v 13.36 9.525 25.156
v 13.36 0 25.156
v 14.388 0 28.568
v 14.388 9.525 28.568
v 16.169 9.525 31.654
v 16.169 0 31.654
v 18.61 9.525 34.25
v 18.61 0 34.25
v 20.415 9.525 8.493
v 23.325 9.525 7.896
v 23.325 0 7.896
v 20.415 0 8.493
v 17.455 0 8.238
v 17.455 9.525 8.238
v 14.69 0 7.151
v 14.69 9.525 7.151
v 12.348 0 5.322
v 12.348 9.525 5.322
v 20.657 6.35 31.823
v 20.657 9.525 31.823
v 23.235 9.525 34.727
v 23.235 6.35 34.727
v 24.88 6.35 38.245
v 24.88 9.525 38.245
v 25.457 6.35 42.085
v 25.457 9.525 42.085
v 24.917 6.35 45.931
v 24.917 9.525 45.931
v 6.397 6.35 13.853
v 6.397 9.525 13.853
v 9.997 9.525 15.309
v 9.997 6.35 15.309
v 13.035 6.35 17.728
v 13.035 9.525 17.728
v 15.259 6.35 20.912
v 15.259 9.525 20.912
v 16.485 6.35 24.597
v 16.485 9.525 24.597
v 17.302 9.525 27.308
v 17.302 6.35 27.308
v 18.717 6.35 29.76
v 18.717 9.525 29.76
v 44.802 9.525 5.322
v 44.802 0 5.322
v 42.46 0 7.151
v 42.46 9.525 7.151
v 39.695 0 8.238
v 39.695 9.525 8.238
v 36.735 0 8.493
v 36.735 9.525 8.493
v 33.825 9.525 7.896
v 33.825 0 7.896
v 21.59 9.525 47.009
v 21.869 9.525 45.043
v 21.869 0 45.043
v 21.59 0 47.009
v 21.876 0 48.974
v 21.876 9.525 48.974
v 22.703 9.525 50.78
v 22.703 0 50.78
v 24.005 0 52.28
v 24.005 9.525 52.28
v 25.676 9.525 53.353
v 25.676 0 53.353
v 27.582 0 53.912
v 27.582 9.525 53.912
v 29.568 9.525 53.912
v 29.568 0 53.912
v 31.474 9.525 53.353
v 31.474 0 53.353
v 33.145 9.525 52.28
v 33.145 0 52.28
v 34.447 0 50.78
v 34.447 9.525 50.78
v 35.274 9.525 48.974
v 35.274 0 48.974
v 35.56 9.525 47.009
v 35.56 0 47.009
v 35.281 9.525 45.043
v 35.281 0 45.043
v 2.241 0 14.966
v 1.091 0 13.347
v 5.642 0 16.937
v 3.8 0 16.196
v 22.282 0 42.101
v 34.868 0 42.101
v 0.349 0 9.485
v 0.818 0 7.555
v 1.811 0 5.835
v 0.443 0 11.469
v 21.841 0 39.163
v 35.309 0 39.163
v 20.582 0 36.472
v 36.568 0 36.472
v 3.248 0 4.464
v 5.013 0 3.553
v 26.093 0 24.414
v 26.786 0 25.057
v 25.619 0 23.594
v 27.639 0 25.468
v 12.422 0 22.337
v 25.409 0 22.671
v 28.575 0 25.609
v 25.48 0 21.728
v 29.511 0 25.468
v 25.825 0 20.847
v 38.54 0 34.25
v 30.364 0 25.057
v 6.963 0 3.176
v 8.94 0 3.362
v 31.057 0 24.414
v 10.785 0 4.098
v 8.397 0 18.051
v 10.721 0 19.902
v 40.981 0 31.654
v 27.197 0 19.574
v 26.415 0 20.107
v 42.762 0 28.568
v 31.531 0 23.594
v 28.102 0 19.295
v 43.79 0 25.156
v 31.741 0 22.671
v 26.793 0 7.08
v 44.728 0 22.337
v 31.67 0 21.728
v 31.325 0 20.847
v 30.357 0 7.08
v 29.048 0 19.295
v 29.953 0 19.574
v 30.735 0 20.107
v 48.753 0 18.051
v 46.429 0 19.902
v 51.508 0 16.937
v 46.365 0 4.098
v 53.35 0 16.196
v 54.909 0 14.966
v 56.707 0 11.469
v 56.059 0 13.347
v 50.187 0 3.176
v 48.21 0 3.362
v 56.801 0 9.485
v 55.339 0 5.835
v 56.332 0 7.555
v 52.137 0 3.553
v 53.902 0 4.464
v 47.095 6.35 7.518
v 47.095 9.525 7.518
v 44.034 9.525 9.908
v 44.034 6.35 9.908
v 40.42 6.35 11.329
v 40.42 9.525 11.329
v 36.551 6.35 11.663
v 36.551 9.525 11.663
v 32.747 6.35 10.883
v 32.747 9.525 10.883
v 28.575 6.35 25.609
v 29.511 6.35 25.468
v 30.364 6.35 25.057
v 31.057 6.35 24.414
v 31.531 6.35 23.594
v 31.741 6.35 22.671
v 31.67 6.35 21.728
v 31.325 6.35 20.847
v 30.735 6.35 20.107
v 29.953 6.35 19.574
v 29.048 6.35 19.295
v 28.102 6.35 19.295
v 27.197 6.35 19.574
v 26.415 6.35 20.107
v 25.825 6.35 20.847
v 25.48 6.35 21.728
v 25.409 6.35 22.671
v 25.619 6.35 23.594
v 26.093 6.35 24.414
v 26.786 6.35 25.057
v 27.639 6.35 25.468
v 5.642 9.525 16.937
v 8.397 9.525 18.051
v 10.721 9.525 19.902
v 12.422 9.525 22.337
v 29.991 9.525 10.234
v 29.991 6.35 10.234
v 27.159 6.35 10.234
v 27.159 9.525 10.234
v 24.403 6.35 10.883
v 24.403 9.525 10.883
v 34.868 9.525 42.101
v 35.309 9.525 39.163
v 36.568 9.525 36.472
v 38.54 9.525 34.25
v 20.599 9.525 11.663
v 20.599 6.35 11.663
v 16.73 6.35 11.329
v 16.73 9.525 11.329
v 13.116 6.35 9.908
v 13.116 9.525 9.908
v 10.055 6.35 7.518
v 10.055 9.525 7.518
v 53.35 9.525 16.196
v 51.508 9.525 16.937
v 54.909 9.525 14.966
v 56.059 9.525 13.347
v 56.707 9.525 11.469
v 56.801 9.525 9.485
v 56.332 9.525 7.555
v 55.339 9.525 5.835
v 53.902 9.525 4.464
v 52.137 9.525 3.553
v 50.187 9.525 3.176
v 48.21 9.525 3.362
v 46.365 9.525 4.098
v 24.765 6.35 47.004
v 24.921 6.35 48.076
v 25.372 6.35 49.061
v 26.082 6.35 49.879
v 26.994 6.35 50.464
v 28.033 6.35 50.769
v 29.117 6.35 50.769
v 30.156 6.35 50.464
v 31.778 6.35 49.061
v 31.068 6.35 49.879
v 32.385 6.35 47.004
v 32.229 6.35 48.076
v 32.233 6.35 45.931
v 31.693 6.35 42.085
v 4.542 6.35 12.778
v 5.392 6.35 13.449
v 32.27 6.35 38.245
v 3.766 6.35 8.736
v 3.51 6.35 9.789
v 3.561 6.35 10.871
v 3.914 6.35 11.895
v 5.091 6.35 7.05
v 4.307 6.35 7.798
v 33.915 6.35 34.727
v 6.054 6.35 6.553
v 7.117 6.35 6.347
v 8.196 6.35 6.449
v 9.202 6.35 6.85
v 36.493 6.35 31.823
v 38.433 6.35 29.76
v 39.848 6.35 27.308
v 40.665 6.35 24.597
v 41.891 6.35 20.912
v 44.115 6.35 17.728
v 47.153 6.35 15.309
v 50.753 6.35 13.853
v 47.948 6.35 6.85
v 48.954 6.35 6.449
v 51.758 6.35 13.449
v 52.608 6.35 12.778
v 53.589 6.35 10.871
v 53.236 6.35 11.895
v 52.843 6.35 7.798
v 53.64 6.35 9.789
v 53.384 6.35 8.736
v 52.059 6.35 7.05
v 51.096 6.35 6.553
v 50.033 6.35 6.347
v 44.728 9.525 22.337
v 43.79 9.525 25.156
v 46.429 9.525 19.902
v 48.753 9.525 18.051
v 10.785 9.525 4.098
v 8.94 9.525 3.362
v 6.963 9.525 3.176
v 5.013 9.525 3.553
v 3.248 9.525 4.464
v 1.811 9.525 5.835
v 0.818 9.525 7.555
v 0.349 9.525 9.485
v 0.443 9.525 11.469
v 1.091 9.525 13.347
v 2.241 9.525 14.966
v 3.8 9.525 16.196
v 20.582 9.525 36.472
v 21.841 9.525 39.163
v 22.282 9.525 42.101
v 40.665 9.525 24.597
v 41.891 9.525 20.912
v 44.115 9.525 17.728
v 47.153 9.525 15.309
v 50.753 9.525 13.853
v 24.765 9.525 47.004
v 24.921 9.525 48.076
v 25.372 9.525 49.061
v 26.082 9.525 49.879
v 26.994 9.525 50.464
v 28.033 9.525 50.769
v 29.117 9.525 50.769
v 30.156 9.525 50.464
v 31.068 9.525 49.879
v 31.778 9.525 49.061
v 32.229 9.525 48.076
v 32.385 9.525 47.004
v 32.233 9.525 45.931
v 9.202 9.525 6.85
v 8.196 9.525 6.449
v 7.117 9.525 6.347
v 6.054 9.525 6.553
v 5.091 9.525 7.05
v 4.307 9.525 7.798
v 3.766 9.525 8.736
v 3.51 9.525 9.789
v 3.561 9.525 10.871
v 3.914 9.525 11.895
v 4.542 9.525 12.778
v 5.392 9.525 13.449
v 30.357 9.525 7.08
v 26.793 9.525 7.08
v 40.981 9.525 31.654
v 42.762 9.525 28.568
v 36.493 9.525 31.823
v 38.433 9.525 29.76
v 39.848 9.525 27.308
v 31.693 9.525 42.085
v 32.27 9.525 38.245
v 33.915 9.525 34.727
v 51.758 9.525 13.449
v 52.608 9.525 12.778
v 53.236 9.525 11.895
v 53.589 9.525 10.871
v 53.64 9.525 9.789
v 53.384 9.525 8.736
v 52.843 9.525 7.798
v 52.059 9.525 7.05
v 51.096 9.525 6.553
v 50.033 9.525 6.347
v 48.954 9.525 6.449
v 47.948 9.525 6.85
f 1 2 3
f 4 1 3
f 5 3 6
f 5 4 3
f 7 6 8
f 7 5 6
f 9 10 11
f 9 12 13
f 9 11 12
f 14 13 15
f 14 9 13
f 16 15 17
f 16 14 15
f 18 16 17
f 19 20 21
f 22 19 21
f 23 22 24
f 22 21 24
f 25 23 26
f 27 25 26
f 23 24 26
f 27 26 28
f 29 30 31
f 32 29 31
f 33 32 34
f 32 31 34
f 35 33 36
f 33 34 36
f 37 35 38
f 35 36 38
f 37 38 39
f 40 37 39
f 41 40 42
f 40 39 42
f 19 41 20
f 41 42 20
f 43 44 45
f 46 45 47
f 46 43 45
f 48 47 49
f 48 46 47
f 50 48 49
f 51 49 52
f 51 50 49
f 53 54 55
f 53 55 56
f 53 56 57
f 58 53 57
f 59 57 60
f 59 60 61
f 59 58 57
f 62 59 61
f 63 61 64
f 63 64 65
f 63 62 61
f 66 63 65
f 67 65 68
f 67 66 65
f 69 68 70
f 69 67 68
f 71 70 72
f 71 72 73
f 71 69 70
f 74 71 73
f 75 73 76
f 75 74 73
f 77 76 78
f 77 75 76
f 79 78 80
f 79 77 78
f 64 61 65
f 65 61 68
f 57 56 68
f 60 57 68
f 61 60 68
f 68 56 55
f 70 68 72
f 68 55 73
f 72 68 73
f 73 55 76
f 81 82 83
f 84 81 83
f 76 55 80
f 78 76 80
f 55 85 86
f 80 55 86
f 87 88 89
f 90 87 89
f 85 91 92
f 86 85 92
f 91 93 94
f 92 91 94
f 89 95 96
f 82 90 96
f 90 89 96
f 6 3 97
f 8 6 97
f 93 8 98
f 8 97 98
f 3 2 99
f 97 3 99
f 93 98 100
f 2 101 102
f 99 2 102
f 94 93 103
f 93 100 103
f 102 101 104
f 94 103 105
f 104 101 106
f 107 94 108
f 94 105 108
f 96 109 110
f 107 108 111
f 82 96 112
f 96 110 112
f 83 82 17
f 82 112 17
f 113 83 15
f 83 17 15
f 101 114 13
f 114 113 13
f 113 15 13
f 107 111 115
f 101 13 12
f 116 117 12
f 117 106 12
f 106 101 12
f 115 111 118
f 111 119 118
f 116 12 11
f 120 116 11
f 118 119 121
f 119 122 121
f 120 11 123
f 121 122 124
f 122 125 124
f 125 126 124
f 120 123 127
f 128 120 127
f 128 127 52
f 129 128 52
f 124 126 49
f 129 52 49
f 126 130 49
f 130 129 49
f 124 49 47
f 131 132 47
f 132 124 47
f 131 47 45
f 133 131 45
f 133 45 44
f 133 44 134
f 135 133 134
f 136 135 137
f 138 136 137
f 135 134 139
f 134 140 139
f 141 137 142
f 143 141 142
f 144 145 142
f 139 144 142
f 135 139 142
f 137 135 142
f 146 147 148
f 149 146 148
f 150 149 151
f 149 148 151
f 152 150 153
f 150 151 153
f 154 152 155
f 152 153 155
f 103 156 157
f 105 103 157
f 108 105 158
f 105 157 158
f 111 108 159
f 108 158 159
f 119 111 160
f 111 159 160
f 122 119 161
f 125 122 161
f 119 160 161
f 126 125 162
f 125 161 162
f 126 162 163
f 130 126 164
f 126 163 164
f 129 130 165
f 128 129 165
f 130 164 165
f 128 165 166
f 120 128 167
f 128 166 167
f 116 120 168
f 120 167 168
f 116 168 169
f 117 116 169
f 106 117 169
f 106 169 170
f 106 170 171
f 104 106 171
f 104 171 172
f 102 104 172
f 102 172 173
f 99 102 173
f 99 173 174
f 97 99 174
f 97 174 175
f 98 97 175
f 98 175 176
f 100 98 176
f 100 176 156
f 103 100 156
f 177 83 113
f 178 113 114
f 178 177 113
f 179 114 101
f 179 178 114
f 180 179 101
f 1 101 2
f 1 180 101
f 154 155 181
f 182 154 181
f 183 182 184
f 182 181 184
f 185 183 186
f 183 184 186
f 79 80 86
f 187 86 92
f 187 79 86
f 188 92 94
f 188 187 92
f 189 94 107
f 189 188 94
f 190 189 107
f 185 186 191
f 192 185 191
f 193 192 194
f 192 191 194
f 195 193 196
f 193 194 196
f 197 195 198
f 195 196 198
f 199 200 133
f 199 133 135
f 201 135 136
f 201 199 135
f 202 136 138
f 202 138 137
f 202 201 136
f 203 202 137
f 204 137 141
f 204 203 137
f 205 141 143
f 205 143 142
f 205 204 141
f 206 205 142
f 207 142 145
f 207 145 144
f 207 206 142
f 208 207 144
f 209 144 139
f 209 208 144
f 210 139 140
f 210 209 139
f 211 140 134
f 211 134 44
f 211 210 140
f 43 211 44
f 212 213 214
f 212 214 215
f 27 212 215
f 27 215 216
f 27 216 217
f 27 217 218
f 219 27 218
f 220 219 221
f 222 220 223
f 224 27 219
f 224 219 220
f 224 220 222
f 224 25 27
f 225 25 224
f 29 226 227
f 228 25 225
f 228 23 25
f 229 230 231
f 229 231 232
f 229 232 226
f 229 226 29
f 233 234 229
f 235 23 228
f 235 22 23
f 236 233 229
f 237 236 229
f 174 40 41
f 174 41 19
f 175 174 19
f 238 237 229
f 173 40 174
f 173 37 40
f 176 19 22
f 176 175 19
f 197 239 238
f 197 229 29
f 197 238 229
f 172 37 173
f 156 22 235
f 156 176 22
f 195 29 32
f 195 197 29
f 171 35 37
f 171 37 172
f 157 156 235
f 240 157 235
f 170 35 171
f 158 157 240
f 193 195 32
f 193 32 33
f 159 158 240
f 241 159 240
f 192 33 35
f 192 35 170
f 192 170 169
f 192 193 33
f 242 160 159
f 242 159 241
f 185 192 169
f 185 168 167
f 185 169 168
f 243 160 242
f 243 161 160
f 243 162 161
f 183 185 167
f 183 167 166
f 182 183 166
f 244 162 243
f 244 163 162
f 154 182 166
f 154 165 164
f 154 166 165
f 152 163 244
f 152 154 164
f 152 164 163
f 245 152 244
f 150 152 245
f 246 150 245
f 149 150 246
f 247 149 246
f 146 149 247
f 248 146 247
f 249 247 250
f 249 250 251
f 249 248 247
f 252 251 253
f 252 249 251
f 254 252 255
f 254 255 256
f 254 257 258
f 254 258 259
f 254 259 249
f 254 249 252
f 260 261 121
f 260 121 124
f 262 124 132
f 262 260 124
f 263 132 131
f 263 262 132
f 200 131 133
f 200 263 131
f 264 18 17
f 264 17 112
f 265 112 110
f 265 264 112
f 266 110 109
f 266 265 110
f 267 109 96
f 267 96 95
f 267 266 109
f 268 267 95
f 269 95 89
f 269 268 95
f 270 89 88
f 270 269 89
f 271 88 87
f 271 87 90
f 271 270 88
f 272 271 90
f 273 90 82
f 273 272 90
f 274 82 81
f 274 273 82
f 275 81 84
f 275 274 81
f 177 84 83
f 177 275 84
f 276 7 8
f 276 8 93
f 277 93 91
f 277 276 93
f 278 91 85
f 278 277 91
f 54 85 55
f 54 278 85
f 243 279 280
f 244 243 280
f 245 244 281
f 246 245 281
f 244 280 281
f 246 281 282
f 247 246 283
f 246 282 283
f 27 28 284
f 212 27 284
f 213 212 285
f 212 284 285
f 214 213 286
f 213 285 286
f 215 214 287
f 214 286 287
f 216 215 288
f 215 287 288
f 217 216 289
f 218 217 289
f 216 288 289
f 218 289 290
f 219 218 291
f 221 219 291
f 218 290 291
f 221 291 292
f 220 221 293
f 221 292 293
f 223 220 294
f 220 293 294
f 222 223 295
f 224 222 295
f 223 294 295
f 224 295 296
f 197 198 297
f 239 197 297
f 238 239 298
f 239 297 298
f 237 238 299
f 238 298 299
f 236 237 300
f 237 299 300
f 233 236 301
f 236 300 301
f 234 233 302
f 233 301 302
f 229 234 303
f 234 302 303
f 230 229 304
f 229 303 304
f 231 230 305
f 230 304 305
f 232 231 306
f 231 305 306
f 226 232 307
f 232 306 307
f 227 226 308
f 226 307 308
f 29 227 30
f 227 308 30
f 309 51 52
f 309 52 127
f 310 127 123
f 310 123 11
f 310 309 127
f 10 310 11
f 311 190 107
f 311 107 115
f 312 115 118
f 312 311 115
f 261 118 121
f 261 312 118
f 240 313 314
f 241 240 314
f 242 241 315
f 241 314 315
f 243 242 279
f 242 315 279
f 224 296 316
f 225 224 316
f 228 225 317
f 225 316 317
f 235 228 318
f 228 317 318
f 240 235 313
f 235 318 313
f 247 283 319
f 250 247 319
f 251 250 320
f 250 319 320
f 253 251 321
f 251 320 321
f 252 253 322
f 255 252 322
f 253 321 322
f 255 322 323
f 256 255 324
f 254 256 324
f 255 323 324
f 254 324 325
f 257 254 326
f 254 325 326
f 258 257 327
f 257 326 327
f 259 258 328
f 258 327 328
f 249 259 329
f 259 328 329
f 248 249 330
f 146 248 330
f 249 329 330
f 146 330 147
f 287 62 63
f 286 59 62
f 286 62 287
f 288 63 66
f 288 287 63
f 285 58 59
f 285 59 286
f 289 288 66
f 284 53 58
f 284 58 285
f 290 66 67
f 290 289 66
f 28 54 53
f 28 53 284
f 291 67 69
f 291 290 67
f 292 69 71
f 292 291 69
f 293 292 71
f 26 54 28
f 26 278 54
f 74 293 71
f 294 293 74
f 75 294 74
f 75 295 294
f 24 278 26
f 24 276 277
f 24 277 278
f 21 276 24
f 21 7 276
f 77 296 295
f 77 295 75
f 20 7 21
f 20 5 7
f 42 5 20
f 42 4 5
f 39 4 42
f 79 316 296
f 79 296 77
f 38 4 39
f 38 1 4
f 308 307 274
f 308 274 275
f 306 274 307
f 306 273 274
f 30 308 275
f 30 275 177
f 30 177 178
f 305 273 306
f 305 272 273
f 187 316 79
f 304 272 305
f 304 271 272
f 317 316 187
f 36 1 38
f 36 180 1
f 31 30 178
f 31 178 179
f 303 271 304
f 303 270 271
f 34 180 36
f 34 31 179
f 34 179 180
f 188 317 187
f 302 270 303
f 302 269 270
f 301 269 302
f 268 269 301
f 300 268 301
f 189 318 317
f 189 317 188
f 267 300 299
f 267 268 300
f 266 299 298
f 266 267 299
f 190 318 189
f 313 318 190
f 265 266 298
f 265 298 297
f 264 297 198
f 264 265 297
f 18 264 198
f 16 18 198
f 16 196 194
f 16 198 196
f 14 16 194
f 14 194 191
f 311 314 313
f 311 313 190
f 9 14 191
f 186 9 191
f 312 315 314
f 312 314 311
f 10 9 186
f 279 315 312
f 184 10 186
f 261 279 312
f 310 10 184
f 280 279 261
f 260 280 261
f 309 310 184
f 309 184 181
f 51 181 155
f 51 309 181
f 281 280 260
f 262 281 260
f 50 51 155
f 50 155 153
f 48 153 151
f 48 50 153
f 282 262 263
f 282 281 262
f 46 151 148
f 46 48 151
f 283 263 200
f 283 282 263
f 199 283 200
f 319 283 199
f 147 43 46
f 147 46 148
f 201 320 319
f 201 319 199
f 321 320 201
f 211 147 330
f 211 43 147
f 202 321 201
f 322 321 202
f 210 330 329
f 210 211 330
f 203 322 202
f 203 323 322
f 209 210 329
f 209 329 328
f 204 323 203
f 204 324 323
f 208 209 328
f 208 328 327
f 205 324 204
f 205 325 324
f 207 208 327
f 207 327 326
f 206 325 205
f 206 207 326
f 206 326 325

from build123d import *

# Parameters (mm, degrees)
SKETCH1_W           = 57.15
SKETCH1_H           = 57.15
BOSS_EXTRUDE1_DEPTH = 9.525
SKETCH5_R           = 12.281683601
SKETCH5_R_2         = 3.302
CUT_EXTRUDE1_DEPTH  = 3.175
SKETCH7_W           = 57.15
SKETCH7_H           = 57.15
CUT_EXTRUDE2_DEPTH  = 9.652
SKETCH10_R          = 3.175
CUT_EXTRUDE4_DEPTH  = 79.640756641


with BuildPart() as part:
    # Sketch1 → Boss-Extrude1 (new body)
    with BuildSketch(Plane(origin=(0, 0, 0), x_dir=(1, 0, 0), z_dir=(0, 1, 0))):
        with Locations((28.575, -28.575)):
            Rectangle(SKETCH1_W, SKETCH1_H)
    extrude(amount=BOSS_EXTRUDE1_DEPTH)

    # Sketch5 → Cut-Extrude1 (cut)
    # profile 1 of 5: a face of its own
    with BuildSketch(Plane(origin=(0, 9.525, 0), x_dir=(1, 0, 0), z_dir=(0, 1, 0))):
        with BuildLine():
            ThreePointArc((32.232759975, -45.931274041), (32.269707879, -38.244901062), (36.493054182, -31.822670864))
            ThreePointArc((36.493054182, -31.822670864), (28.575, -34.715841801), (20.656945818, -31.822670864))
            ThreePointArc((20.656945818, -31.822670864), (24.880292121, -38.244901062), (24.917240025, -45.931274041))
            ThreePointArc((24.917240025, -45.931274041), (28.575, -50.807525402), (32.232759975, -45.931274041))
        make_face()
    # profile 2 of 5: a face of its own
    with BuildSketch(Plane(origin=(0, 9.525, 0), x_dir=(1, 0, 0), z_dir=(0, 1, 0))):
        with Locations((28.575, -22.434158199)):
            Circle(SKETCH5_R)
        with Locations((28.575, -22.434158199)):
            Circle(SKETCH5_R_2, mode=Mode.SUBTRACT)
    # profile 3 of 5: a face of its own
    with BuildSketch(Plane(origin=(0, 9.525, 0), x_dir=(1, 0, 0), z_dir=(0, 1, 0))):
        with Locations((28.575, -22.434158199)):
            Circle(SKETCH5_R_2)
    # profile 4 of 5: a face of its own
    with BuildSketch(Plane(origin=(0, 9.525, 0), x_dir=(1, 0, 0), z_dir=(0, 1, 0))):
        with BuildLine():
            ThreePointArc((16.485282438, -24.597137937), (17.93875, -16.293316399), (24.403336619, -10.882665797))
            ThreePointArc((24.403336619, -10.882665797), (16.729848967, -11.329075886), (10.054780753, -7.517887219))
            ThreePointArc((10.054780753, -7.517887219), (4.002943212, -8.247474598), (6.397020778, -13.853313338))
            ThreePointArc((6.397020778, -13.853313338), (13.035141089, -17.72849765), (16.485282438, -24.597137937))
        make_face()
    # profile 5 of 5: a face of its own
    with BuildSketch(Plane(origin=(0, 9.525, 0), x_dir=(1, 0, 0), z_dir=(0, 1, 0))):
        with BuildLine():
            ThreePointArc((32.746663381, -10.882665797), (38.626736214, -15.377080109), (40.856683601, -22.434158199))
            ThreePointArc((40.856683601, -22.434158199), (40.808597958, -23.519898995), (40.664717562, -24.597137937))
            ThreePointArc((40.664717562, -24.597137937), (44.114858911, -17.72849765), (50.752979222, -13.853313338))
            ThreePointArc((50.752979222, -13.853313338), (53.147056788, -8.247474598), (47.095219247, -7.517887219))
            ThreePointArc((47.095219247, -7.517887219), (40.420151033, -11.329075886), (32.746663381, -10.882665797))
        make_face()
    extrude(amount=-CUT_EXTRUDE1_DEPTH, mode=Mode.SUBTRACT)

    # Sketch7 → Cut-Extrude2 (cut)
    with BuildSketch(Plane(origin=(0, 9.525, 0), x_dir=(1, 0, 0), z_dir=(0, 1, 0))):
        with Locations((28.575, -28.575)):
            Rectangle(SKETCH7_W, SKETCH7_H)
        with BuildLine():
            ThreePointArc((12.348348048, -5.322397737), (1.253312555, -6.659974598), (5.64245476, -16.937345621))
            ThreePointArc((5.64245476, -16.937345621), (10.720573118, -19.901836121), (13.359908547, -25.156300743))
            ThreePointArc((13.359908547, -25.156300743), (15.189119343, -30.1625), (18.610009678, -34.249742647))
            ThreePointArc((18.610009678, -34.249742647), (21.840841809, -39.162706489), (21.869106713, -45.042731239))
            ThreePointArc((21.869106713, -45.042731239), (28.575, -53.982525402), (35.280893287, -45.042731239))
            ThreePointArc((35.280893287, -45.042731239), (35.309158191, -39.162706489), (38.539990322, -34.249742647))
            ThreePointArc((38.539990322, -34.249742647), (41.960880657, -30.1625), (43.790091453, -25.156300743))
            ThreePointArc((43.790091453, -25.156300743), (46.429426882, -19.901836121), (51.50754524, -16.937345621))
            ThreePointArc((51.50754524, -16.937345621), (55.896687445, -6.659974598), (44.801651952, -5.322397737))
            ThreePointArc((44.801651952, -5.322397737), (39.695268692, -8.237931989), (33.825101131, -7.896431208))
            ThreePointArc((33.825101131, -7.896431208), (28.575, -6.977474598), (23.324898869, -7.896431208))
            ThreePointArc((23.324898869, -7.896431208), (17.454731308, -8.237931989), (12.348348048, -5.322397737))
        make_face(mode=Mode.SUBTRACT)
    extrude(amount=-CUT_EXTRUDE2_DEPTH, mode=Mode.SUBTRACT)

    # Sketch10 → Cut-Extrude4 (cut, through all)
    with BuildSketch(Plane(origin=(0, 6.35, 0), x_dir=(1, 0, 0), z_dir=(0, 1, 0))):
        with Locations(Location((28.575, -22.434158199, 0), (0, 0, 270))):
            Circle(SKETCH10_R)
    extrude(amount=-CUT_EXTRUDE4_DEPTH, mode=Mode.SUBTRACT)


solid = part.part
